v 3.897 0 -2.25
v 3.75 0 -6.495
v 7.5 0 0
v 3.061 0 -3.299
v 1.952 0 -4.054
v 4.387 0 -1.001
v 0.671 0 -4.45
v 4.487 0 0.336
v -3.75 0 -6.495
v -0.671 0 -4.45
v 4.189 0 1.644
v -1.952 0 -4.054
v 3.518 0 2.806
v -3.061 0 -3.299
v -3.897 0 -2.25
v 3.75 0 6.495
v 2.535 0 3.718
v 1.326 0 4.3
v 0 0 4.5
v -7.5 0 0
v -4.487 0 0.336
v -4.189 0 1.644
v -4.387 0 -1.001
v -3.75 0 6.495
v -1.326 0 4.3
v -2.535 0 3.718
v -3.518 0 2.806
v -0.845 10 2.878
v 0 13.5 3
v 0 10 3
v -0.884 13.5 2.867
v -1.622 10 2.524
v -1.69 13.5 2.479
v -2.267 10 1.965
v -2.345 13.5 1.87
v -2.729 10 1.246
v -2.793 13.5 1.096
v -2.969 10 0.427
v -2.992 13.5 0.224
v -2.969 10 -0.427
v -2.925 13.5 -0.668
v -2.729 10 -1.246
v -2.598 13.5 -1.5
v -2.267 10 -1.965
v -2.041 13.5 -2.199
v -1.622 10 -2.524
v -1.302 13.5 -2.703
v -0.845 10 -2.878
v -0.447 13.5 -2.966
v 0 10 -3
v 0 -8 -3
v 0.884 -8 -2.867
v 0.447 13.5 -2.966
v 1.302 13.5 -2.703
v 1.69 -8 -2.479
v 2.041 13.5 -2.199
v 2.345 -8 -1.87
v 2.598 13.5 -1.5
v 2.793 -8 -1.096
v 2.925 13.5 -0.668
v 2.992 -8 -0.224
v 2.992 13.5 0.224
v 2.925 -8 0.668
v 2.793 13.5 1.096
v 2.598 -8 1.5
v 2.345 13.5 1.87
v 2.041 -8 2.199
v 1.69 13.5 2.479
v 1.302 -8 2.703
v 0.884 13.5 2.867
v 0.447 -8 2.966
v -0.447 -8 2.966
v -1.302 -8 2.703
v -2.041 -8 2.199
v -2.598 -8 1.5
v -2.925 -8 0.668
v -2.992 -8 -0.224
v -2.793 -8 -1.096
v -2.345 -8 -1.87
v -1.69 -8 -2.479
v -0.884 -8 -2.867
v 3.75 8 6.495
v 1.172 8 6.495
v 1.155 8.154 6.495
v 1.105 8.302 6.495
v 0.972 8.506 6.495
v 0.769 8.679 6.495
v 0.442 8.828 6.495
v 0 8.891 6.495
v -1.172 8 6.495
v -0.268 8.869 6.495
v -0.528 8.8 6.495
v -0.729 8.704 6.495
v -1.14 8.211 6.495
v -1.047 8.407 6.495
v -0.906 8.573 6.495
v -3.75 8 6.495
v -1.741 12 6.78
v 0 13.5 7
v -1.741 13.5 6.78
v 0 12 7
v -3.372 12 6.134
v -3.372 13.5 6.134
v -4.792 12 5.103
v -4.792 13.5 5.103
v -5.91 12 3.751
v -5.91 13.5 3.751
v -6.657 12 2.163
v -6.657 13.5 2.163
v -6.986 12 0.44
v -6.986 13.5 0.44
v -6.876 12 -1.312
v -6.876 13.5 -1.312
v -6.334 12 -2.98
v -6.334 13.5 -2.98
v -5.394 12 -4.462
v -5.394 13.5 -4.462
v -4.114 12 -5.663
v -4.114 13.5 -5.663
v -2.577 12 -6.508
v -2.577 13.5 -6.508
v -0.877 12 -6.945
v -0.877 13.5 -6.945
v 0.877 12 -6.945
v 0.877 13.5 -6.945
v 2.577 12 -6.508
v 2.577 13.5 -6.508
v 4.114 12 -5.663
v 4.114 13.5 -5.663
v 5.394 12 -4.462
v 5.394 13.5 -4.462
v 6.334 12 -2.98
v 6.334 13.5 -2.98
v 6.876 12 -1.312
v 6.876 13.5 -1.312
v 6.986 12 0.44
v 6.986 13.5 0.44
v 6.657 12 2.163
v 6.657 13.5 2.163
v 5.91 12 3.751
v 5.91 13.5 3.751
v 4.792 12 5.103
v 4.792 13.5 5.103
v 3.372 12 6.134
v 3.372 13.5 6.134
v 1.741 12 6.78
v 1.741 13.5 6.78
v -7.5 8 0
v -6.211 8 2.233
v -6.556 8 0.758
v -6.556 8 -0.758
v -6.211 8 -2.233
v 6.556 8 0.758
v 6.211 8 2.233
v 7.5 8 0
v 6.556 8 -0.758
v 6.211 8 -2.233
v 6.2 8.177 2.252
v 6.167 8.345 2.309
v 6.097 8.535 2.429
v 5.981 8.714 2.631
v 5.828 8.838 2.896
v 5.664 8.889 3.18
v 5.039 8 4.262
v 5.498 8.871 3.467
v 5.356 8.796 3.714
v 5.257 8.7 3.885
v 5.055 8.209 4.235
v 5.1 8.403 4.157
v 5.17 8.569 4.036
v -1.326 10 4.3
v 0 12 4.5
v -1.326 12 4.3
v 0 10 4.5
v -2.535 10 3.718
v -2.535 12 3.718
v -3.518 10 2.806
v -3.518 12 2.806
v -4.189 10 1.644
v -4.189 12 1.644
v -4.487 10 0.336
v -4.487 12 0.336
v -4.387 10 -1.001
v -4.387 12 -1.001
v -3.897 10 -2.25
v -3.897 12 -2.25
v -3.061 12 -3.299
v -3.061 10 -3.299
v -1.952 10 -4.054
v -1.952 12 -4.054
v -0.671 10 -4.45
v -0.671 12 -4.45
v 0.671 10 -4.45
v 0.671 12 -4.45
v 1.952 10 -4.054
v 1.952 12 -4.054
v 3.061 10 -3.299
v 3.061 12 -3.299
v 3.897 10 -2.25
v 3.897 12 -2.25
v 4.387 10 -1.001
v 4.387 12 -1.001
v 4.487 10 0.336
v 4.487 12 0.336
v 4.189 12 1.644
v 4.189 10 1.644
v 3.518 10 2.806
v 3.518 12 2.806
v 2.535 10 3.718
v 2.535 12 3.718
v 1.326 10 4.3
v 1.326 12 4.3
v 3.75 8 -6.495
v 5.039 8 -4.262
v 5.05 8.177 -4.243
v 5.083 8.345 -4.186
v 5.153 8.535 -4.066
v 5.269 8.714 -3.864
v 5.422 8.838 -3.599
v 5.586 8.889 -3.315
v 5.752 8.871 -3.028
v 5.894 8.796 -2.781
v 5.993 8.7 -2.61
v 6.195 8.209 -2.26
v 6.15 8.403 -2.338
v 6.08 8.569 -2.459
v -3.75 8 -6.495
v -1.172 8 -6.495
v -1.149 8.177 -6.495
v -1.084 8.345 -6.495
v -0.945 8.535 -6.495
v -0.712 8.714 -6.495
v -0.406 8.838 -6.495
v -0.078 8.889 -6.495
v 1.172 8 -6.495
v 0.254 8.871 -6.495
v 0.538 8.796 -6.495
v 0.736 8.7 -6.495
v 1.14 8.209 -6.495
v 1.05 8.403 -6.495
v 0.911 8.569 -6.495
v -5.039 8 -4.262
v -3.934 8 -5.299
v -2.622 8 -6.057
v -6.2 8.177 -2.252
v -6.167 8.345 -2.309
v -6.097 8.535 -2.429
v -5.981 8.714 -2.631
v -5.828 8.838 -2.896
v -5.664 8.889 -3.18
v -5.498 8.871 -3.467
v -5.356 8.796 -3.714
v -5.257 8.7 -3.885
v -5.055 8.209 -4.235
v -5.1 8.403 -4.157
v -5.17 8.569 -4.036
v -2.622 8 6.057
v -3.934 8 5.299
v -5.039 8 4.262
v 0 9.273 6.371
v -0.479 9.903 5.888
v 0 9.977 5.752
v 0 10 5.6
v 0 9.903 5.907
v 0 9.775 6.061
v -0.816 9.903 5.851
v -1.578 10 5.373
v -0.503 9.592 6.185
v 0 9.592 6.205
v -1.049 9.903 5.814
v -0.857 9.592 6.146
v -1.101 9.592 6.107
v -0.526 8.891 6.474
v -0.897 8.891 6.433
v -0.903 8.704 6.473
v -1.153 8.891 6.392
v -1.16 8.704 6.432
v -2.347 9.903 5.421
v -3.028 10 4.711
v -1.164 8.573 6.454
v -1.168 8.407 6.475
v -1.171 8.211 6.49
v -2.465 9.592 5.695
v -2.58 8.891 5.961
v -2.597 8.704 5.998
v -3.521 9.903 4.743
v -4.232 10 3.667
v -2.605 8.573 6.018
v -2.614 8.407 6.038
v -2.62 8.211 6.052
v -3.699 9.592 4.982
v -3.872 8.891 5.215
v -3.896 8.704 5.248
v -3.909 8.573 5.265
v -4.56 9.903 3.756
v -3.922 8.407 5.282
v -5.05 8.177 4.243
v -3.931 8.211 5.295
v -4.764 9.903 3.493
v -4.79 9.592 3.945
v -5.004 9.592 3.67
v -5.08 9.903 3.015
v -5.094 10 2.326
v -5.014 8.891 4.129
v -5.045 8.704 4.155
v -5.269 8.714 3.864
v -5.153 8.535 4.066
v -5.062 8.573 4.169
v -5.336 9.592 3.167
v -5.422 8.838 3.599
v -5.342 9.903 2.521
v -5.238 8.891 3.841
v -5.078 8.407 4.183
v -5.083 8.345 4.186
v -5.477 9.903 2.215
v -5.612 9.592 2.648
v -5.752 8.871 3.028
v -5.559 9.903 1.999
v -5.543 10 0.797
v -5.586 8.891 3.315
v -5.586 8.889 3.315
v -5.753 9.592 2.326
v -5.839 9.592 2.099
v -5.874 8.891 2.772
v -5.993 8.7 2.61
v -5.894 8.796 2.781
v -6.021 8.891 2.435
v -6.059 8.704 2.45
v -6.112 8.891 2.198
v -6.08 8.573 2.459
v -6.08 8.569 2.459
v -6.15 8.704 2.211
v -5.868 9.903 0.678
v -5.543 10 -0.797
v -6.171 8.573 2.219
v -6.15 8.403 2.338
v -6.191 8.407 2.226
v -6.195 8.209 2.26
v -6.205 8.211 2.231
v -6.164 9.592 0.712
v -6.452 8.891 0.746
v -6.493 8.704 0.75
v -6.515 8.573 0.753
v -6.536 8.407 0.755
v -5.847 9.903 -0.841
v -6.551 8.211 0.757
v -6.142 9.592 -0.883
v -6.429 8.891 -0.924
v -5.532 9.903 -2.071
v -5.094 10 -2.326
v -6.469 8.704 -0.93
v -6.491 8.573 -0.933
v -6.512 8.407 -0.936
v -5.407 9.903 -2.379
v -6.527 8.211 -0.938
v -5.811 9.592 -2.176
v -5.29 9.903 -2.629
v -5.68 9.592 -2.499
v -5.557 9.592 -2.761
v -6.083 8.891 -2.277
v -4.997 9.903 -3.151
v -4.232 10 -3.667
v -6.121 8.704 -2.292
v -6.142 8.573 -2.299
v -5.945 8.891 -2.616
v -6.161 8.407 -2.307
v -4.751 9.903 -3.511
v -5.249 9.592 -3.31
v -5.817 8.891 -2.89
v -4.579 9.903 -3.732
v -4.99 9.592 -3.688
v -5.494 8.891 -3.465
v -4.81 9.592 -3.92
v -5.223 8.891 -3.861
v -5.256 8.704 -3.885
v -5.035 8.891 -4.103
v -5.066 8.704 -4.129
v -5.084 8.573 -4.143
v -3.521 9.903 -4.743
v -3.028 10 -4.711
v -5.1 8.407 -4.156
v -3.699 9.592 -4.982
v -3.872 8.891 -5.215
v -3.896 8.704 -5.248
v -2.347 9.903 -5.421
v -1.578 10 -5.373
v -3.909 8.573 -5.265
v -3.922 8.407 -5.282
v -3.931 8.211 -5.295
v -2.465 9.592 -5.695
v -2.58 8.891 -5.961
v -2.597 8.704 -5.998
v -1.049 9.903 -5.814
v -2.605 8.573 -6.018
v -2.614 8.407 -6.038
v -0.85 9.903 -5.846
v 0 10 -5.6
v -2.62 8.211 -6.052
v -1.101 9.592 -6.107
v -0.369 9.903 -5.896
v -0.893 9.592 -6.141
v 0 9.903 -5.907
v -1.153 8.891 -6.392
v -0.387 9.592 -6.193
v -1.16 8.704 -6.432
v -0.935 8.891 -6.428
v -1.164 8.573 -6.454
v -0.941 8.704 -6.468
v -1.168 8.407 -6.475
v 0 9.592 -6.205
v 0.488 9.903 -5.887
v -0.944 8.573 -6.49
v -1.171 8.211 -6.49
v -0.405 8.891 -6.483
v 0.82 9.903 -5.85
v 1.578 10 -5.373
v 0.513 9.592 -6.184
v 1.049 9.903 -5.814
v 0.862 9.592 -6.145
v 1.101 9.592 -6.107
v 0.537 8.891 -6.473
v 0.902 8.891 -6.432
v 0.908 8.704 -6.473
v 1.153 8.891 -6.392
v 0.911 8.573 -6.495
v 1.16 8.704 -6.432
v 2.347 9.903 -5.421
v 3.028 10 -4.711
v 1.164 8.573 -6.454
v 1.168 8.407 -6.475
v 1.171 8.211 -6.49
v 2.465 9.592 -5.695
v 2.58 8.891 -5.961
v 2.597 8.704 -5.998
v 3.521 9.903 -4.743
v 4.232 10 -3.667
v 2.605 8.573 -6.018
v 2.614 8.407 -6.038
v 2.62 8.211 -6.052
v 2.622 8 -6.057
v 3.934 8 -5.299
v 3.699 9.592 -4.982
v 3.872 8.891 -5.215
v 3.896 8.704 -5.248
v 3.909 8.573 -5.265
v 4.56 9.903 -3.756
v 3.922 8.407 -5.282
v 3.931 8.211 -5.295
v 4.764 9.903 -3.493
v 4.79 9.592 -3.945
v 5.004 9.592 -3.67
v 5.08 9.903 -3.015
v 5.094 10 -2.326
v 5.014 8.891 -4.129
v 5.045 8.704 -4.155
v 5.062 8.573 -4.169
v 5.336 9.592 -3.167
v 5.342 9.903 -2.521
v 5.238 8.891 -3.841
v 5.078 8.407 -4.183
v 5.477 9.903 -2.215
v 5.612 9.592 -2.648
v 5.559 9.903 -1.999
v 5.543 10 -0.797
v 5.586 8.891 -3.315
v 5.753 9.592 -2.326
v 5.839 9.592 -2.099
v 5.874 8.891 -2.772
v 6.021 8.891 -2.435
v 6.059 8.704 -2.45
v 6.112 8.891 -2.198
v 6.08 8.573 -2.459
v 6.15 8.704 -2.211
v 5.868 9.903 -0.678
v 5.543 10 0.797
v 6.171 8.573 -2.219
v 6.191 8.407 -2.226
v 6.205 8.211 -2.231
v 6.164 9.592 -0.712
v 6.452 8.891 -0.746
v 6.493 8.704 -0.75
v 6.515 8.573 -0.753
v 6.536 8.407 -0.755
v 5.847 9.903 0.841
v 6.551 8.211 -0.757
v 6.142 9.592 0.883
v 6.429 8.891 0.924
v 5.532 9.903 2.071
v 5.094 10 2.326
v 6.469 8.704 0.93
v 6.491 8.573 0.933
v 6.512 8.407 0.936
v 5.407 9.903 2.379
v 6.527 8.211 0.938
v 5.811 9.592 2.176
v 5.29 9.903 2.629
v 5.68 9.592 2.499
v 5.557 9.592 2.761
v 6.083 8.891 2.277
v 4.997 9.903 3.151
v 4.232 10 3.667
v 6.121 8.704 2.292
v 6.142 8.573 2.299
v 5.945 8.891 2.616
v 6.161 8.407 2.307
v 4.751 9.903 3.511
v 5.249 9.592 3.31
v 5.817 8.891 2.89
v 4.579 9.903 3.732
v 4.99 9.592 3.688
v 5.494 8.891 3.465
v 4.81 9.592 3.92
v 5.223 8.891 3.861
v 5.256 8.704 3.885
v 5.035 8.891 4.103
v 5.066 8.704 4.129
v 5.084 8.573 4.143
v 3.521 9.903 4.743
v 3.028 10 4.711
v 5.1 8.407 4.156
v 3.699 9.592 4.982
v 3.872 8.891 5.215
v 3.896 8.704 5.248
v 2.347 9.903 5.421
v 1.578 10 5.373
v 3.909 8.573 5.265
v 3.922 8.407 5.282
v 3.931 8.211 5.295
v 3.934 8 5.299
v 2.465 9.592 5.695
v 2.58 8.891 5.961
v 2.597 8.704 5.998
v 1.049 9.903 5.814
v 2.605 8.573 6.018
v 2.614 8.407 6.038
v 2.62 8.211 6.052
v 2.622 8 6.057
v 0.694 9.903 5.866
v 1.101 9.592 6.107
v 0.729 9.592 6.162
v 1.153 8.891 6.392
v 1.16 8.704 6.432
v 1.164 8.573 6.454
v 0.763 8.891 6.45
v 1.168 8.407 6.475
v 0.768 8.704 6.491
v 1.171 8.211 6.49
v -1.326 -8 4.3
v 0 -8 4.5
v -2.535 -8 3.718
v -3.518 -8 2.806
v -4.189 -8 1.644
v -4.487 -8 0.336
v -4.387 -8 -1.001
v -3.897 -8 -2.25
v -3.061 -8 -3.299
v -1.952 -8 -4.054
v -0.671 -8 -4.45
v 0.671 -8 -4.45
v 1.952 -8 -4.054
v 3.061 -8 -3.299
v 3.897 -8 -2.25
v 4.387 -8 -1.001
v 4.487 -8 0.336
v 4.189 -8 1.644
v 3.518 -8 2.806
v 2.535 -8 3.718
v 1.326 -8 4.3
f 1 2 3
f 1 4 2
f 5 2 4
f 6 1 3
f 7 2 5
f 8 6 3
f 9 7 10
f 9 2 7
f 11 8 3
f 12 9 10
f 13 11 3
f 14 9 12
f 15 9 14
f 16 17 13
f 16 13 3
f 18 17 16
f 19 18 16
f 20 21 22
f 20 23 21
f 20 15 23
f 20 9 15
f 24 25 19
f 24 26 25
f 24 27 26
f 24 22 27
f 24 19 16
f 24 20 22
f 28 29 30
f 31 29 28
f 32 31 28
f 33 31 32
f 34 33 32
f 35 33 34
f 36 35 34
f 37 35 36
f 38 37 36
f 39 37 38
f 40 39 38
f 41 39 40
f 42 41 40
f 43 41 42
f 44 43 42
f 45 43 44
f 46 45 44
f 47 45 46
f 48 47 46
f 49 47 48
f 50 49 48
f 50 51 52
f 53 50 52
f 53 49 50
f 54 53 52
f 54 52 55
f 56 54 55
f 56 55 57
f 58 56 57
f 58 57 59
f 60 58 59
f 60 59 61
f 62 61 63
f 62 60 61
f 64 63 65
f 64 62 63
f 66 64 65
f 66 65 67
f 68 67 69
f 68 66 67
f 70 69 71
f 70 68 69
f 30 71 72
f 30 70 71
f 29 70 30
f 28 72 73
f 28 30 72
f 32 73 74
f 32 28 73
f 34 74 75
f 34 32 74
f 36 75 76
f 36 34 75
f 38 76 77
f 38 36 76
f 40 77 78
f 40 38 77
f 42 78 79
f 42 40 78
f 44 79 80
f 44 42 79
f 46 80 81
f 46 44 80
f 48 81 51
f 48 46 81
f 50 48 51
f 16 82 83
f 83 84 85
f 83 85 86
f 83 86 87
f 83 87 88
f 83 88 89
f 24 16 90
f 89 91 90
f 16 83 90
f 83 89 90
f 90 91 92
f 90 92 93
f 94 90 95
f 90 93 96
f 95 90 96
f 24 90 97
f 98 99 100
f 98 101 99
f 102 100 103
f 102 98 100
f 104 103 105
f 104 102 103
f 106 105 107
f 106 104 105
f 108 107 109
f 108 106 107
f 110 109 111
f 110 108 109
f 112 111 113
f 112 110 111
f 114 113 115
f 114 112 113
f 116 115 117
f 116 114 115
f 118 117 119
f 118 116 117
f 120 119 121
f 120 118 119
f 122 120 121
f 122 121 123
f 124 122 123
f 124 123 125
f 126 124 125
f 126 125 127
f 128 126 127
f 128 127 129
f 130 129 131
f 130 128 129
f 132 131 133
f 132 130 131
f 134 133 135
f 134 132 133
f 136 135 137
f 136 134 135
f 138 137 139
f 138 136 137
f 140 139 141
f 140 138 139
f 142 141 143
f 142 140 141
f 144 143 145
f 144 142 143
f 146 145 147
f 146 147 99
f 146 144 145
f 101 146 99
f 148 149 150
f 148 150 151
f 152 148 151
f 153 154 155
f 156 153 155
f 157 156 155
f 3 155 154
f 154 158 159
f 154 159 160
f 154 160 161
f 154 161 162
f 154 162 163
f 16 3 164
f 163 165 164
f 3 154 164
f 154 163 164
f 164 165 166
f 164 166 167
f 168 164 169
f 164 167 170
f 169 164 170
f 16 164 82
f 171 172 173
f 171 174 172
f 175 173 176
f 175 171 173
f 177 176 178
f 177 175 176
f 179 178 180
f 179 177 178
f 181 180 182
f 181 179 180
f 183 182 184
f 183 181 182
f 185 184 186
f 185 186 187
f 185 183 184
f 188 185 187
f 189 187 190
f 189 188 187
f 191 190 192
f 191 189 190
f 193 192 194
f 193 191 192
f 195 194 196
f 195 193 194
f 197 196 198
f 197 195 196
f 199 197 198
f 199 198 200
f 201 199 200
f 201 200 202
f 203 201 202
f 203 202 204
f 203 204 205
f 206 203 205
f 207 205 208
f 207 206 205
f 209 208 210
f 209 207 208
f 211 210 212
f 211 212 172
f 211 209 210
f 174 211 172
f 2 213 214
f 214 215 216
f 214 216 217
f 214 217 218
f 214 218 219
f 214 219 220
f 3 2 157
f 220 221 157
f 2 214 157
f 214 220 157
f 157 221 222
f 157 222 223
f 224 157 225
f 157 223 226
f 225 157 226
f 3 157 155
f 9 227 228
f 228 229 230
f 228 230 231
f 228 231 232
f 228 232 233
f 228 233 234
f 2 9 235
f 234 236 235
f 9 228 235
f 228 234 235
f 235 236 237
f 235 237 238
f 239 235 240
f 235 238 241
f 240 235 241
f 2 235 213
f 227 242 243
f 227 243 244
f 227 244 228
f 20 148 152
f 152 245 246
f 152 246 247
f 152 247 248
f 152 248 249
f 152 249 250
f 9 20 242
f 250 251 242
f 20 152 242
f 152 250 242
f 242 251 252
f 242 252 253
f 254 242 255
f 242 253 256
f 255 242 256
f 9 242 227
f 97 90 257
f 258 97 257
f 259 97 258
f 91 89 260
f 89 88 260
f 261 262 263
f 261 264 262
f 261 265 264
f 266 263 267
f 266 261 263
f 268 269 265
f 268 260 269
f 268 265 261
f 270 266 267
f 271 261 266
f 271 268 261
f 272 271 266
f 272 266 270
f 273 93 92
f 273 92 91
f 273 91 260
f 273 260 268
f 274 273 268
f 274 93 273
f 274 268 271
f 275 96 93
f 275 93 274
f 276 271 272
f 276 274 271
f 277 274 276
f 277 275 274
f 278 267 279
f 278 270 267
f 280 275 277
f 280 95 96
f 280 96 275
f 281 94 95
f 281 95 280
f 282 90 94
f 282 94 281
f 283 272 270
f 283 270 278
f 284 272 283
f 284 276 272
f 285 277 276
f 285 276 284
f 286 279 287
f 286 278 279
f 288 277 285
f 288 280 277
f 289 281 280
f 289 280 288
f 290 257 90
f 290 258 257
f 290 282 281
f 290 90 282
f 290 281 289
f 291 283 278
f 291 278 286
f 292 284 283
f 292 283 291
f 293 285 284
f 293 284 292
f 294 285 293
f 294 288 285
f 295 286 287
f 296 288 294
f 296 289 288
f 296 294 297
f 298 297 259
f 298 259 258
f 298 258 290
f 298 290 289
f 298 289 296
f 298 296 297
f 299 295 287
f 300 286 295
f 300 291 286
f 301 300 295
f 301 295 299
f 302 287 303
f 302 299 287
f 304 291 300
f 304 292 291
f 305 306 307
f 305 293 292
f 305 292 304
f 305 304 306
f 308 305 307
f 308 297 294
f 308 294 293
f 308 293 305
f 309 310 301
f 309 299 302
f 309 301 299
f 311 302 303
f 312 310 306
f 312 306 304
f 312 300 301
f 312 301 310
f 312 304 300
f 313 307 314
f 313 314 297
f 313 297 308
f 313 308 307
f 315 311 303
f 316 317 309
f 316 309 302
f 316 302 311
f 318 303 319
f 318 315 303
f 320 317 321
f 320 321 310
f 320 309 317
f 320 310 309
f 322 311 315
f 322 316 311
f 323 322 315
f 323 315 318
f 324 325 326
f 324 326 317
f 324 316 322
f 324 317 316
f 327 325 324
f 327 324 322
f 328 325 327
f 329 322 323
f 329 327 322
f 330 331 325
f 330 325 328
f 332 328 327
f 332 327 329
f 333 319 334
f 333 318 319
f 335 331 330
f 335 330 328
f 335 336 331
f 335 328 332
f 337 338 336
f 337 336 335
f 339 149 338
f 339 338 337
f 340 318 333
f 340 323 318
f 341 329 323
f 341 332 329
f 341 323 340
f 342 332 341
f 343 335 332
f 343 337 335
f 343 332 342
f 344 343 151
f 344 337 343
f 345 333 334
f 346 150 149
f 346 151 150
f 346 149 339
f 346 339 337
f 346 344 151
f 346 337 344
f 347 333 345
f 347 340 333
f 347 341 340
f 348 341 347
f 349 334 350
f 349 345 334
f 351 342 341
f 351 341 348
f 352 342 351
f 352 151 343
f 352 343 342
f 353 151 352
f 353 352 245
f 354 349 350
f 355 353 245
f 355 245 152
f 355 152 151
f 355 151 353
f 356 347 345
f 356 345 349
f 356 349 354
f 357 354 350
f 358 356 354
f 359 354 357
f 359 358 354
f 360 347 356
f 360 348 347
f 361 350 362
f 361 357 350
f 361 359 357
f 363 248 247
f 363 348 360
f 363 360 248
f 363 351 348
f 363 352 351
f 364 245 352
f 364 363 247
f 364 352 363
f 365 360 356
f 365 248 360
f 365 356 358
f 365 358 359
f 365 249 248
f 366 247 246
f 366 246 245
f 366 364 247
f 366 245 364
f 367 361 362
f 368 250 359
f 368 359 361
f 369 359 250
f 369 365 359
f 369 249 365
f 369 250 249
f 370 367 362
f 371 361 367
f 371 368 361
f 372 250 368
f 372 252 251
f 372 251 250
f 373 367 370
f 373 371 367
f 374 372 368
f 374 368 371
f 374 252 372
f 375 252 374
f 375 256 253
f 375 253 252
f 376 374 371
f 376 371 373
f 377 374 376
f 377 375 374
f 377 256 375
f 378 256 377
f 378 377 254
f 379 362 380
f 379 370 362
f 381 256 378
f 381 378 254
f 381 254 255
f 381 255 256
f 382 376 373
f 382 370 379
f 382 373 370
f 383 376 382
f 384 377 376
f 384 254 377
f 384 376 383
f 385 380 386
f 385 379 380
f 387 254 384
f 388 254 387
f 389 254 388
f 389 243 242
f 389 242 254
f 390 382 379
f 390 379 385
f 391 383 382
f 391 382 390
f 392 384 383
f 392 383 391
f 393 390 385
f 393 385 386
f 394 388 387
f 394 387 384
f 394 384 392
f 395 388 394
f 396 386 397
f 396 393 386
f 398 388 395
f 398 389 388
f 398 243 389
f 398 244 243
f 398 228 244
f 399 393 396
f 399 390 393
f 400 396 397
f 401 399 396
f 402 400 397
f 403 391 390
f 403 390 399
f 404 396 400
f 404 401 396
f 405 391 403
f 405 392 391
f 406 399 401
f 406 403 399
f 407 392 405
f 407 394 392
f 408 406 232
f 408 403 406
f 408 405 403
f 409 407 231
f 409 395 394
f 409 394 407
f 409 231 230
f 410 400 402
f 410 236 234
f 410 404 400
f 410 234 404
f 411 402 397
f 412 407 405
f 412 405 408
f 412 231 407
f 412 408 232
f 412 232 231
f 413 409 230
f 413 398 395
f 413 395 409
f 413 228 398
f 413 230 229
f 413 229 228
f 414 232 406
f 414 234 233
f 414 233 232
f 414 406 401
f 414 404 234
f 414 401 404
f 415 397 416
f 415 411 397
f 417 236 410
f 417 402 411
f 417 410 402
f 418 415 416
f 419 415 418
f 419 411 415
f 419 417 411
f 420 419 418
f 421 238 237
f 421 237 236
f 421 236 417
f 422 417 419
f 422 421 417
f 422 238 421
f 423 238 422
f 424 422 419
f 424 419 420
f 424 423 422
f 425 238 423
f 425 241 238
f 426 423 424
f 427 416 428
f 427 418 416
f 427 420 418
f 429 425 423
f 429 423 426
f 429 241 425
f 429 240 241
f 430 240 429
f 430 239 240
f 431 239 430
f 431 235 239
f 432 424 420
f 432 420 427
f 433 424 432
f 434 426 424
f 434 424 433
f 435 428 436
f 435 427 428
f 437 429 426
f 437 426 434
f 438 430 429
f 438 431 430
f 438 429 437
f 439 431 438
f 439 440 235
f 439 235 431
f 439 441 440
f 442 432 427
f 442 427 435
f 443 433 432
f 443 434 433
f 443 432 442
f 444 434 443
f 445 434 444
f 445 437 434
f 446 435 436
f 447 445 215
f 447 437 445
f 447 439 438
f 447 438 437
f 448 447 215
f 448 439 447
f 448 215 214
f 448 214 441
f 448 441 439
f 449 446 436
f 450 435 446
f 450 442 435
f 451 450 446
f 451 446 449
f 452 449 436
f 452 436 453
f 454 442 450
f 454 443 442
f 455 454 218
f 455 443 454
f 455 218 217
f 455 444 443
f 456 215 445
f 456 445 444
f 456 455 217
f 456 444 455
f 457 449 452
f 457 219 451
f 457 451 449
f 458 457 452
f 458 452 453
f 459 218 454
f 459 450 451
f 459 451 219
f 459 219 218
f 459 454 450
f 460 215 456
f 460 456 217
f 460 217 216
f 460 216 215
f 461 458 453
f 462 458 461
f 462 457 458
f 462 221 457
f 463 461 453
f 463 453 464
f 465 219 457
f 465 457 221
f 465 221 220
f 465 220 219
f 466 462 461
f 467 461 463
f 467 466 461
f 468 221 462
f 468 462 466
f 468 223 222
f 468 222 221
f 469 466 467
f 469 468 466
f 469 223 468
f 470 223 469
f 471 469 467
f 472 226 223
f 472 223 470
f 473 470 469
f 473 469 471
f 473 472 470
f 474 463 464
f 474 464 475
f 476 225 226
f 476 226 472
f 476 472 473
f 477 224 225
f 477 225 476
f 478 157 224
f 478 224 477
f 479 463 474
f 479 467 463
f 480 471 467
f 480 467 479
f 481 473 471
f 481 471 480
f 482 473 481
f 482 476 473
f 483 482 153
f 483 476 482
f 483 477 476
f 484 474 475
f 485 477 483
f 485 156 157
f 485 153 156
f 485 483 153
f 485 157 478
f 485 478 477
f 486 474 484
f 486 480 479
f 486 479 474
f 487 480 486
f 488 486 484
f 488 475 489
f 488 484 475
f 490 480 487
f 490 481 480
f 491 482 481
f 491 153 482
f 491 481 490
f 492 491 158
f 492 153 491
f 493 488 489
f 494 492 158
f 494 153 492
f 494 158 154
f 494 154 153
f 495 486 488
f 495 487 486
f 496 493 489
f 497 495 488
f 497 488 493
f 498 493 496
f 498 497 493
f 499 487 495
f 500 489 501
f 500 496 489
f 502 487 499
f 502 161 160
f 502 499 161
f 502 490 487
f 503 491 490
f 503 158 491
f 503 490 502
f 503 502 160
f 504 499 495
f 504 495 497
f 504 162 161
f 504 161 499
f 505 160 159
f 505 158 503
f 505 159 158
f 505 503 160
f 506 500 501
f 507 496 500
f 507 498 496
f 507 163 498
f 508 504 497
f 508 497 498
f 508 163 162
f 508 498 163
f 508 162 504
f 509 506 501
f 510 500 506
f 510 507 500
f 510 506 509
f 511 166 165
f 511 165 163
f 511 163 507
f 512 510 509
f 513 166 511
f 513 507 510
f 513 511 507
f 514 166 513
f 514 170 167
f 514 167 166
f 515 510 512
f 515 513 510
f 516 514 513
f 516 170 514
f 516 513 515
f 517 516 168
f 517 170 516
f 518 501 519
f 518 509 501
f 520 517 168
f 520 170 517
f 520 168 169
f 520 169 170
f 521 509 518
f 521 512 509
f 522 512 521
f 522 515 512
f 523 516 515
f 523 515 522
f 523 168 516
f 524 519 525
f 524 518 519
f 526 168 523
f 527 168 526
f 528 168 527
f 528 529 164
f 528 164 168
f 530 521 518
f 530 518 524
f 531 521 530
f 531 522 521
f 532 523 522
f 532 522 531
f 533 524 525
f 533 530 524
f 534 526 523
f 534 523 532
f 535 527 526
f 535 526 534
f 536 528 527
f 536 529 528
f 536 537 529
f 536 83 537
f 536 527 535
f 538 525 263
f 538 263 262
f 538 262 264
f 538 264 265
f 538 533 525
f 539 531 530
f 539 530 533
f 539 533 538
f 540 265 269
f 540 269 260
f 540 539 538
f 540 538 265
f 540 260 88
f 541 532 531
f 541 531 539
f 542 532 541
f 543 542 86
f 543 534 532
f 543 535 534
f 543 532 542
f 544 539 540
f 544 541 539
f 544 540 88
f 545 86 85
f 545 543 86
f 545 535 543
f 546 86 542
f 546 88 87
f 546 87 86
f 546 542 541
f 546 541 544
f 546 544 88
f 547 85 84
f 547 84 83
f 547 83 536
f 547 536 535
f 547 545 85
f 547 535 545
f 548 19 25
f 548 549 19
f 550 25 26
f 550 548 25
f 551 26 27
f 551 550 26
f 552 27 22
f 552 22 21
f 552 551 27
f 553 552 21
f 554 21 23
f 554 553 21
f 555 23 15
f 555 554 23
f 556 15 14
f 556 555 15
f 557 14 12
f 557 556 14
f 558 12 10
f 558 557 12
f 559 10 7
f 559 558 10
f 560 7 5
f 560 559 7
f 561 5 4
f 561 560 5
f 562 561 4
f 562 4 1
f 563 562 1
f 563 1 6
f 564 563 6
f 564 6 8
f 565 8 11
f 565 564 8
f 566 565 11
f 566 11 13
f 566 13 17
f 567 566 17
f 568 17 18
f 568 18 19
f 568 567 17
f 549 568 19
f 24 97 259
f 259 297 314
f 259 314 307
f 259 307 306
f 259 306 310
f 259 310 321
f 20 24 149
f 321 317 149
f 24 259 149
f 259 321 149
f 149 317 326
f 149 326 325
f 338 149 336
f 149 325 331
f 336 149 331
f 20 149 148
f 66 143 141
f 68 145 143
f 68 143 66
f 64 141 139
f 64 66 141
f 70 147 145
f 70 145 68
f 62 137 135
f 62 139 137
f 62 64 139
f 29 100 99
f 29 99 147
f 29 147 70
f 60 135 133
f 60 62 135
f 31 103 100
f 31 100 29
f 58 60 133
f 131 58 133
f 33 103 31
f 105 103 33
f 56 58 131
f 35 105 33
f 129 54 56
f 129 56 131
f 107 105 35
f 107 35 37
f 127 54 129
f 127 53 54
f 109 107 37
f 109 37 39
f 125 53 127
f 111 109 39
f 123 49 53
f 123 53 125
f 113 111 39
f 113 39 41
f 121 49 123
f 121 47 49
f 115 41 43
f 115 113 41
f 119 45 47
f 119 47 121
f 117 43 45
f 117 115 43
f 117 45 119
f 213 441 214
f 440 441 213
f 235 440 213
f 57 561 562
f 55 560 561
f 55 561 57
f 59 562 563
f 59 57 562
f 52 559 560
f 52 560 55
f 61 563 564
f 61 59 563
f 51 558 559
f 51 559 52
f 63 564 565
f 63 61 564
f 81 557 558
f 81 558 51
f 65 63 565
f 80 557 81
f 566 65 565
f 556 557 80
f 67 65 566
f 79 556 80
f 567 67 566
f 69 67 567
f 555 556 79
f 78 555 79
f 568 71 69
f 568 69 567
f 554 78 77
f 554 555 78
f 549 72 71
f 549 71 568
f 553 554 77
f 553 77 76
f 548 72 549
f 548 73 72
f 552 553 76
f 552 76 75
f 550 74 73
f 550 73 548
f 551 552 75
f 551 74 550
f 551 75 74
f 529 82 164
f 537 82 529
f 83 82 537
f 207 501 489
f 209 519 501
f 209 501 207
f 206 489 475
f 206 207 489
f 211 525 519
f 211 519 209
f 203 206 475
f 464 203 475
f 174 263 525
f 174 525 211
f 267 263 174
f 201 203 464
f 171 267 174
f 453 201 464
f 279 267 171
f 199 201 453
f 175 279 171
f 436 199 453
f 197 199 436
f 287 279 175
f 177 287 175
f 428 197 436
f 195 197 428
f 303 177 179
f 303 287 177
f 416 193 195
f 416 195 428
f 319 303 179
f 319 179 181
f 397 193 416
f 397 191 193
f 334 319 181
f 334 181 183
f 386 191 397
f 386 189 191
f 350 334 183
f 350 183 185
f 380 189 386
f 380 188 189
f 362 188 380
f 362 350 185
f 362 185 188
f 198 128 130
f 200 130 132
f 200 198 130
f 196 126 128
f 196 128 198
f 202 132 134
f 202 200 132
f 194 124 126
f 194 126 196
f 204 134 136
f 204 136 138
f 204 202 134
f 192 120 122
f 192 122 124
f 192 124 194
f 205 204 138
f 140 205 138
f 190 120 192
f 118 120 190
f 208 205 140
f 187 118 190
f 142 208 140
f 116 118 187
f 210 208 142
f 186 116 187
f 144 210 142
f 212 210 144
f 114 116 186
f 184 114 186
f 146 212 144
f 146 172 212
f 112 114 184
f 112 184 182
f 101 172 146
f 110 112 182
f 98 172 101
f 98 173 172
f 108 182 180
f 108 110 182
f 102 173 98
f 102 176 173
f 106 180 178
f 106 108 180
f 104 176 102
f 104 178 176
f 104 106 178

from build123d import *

# Parameters (mm, degrees)
FILLET1_SIZE       = 1
FILLET1_SIZE_2     = 2
CUT_EXTRUDE1_DEPTH = 20.19635382
CIRPATTERN1_COUNT  = 6
SKETCH6_R          = 3
CUT_EXTRUDE2_DEPTH = 21.553284565


with BuildPart() as part:
    # Sketch1 → Revolve1 (revolve)
    with BuildSketch(Plane.XY, mode=Mode.PRIVATE) as revolve1_sk:
        Polygon((0, 10), (6.6, 10), (6.6, 8), (7.5, 8), (7.5, 0), (4.5, 0), (4.5, -8), (0, -8), align=None)
    revolve(revolve1_sk.sketch.rotate(Axis((0, 22.612667954, 0), (0, -1, 0)), 90), axis=Axis((0, 22.612667954, 0), (0, -1, 0)))

    # Fillet1
    # an asymmetric fillet: 2, 1 mm, written as the material it takes off along each edge
    with BuildSketch(Plane(origin=(0, 10, 0), x_dir=(0, 0, 1), z_dir=(1, 0, 0))) as fillet1_piece_1:
        with BuildLine():
            Bezier((6.6 - FILLET1_SIZE, 0), (6.6, 0), (6.6, FILLET1_SIZE_2), weights=[1, 0.707106781, 1])
            Line((6.6, FILLET1_SIZE_2), (6.6, 0))
            Line((6.6, 0), (6.6 - FILLET1_SIZE, 0))
        make_face()
    revolve(axis=Axis((0, 10, 0), (0, -1, 0)), mode=Mode.SUBTRACT)

    # Sketch2 → Cut-Extrude1 (cut, symmetric)
    with BuildSketch(Plane(origin=(0, 8, 0), x_dir=(1, 0, 0), z_dir=(0, 1, 0))):
        with BuildLine():
            Line((3.75, 6.495190528), (7.5, 0))
            ThreePointArc((7.5, 0), (6.495190528, 3.75), (3.75, 6.495190528))
        make_face()
    cut_extrude1 = extrude(amount=CUT_EXTRUDE1_DEPTH, both=True, mode=Mode.SUBTRACT)

    # CirPattern1: Cut-Extrude1 ×6 about axis
    cirpattern1_axis = Axis((0, 0, 0), (0, 1, 0))
    for i in range(1, CIRPATTERN1_COUNT):
        add(cut_extrude1.rotate(cirpattern1_axis, i * 360 / CIRPATTERN1_COUNT), mode=Mode.SUBTRACT)

    # Sketch6 → Cut-Extrude2 (cut, through all)
    with BuildSketch(Plane.XZ.offset(8)):
        with Locations(Location((0, 0, 0), (0, 0, 270))):
            Circle(SKETCH6_R)
    extrude(amount=-CUT_EXTRUDE2_DEPTH, mode=Mode.SUBTRACT)

    # Sketch7 → Revolve2 (revolve)
    with BuildSketch(Plane.XY, mode=Mode.PRIVATE) as revolve2_sk:
        Polygon((3, 10), (3, 13.5), (7, 13.5), (7, 12), (4.5, 12), (4.5, 10), align=None)
    revolve(revolve2_sk.sketch.rotate(Axis((0, 10.01, 0), (0, -1, 0)), 90), axis=Axis((0, 10.01, 0), (0, -1, 0)))


solid = part.part
